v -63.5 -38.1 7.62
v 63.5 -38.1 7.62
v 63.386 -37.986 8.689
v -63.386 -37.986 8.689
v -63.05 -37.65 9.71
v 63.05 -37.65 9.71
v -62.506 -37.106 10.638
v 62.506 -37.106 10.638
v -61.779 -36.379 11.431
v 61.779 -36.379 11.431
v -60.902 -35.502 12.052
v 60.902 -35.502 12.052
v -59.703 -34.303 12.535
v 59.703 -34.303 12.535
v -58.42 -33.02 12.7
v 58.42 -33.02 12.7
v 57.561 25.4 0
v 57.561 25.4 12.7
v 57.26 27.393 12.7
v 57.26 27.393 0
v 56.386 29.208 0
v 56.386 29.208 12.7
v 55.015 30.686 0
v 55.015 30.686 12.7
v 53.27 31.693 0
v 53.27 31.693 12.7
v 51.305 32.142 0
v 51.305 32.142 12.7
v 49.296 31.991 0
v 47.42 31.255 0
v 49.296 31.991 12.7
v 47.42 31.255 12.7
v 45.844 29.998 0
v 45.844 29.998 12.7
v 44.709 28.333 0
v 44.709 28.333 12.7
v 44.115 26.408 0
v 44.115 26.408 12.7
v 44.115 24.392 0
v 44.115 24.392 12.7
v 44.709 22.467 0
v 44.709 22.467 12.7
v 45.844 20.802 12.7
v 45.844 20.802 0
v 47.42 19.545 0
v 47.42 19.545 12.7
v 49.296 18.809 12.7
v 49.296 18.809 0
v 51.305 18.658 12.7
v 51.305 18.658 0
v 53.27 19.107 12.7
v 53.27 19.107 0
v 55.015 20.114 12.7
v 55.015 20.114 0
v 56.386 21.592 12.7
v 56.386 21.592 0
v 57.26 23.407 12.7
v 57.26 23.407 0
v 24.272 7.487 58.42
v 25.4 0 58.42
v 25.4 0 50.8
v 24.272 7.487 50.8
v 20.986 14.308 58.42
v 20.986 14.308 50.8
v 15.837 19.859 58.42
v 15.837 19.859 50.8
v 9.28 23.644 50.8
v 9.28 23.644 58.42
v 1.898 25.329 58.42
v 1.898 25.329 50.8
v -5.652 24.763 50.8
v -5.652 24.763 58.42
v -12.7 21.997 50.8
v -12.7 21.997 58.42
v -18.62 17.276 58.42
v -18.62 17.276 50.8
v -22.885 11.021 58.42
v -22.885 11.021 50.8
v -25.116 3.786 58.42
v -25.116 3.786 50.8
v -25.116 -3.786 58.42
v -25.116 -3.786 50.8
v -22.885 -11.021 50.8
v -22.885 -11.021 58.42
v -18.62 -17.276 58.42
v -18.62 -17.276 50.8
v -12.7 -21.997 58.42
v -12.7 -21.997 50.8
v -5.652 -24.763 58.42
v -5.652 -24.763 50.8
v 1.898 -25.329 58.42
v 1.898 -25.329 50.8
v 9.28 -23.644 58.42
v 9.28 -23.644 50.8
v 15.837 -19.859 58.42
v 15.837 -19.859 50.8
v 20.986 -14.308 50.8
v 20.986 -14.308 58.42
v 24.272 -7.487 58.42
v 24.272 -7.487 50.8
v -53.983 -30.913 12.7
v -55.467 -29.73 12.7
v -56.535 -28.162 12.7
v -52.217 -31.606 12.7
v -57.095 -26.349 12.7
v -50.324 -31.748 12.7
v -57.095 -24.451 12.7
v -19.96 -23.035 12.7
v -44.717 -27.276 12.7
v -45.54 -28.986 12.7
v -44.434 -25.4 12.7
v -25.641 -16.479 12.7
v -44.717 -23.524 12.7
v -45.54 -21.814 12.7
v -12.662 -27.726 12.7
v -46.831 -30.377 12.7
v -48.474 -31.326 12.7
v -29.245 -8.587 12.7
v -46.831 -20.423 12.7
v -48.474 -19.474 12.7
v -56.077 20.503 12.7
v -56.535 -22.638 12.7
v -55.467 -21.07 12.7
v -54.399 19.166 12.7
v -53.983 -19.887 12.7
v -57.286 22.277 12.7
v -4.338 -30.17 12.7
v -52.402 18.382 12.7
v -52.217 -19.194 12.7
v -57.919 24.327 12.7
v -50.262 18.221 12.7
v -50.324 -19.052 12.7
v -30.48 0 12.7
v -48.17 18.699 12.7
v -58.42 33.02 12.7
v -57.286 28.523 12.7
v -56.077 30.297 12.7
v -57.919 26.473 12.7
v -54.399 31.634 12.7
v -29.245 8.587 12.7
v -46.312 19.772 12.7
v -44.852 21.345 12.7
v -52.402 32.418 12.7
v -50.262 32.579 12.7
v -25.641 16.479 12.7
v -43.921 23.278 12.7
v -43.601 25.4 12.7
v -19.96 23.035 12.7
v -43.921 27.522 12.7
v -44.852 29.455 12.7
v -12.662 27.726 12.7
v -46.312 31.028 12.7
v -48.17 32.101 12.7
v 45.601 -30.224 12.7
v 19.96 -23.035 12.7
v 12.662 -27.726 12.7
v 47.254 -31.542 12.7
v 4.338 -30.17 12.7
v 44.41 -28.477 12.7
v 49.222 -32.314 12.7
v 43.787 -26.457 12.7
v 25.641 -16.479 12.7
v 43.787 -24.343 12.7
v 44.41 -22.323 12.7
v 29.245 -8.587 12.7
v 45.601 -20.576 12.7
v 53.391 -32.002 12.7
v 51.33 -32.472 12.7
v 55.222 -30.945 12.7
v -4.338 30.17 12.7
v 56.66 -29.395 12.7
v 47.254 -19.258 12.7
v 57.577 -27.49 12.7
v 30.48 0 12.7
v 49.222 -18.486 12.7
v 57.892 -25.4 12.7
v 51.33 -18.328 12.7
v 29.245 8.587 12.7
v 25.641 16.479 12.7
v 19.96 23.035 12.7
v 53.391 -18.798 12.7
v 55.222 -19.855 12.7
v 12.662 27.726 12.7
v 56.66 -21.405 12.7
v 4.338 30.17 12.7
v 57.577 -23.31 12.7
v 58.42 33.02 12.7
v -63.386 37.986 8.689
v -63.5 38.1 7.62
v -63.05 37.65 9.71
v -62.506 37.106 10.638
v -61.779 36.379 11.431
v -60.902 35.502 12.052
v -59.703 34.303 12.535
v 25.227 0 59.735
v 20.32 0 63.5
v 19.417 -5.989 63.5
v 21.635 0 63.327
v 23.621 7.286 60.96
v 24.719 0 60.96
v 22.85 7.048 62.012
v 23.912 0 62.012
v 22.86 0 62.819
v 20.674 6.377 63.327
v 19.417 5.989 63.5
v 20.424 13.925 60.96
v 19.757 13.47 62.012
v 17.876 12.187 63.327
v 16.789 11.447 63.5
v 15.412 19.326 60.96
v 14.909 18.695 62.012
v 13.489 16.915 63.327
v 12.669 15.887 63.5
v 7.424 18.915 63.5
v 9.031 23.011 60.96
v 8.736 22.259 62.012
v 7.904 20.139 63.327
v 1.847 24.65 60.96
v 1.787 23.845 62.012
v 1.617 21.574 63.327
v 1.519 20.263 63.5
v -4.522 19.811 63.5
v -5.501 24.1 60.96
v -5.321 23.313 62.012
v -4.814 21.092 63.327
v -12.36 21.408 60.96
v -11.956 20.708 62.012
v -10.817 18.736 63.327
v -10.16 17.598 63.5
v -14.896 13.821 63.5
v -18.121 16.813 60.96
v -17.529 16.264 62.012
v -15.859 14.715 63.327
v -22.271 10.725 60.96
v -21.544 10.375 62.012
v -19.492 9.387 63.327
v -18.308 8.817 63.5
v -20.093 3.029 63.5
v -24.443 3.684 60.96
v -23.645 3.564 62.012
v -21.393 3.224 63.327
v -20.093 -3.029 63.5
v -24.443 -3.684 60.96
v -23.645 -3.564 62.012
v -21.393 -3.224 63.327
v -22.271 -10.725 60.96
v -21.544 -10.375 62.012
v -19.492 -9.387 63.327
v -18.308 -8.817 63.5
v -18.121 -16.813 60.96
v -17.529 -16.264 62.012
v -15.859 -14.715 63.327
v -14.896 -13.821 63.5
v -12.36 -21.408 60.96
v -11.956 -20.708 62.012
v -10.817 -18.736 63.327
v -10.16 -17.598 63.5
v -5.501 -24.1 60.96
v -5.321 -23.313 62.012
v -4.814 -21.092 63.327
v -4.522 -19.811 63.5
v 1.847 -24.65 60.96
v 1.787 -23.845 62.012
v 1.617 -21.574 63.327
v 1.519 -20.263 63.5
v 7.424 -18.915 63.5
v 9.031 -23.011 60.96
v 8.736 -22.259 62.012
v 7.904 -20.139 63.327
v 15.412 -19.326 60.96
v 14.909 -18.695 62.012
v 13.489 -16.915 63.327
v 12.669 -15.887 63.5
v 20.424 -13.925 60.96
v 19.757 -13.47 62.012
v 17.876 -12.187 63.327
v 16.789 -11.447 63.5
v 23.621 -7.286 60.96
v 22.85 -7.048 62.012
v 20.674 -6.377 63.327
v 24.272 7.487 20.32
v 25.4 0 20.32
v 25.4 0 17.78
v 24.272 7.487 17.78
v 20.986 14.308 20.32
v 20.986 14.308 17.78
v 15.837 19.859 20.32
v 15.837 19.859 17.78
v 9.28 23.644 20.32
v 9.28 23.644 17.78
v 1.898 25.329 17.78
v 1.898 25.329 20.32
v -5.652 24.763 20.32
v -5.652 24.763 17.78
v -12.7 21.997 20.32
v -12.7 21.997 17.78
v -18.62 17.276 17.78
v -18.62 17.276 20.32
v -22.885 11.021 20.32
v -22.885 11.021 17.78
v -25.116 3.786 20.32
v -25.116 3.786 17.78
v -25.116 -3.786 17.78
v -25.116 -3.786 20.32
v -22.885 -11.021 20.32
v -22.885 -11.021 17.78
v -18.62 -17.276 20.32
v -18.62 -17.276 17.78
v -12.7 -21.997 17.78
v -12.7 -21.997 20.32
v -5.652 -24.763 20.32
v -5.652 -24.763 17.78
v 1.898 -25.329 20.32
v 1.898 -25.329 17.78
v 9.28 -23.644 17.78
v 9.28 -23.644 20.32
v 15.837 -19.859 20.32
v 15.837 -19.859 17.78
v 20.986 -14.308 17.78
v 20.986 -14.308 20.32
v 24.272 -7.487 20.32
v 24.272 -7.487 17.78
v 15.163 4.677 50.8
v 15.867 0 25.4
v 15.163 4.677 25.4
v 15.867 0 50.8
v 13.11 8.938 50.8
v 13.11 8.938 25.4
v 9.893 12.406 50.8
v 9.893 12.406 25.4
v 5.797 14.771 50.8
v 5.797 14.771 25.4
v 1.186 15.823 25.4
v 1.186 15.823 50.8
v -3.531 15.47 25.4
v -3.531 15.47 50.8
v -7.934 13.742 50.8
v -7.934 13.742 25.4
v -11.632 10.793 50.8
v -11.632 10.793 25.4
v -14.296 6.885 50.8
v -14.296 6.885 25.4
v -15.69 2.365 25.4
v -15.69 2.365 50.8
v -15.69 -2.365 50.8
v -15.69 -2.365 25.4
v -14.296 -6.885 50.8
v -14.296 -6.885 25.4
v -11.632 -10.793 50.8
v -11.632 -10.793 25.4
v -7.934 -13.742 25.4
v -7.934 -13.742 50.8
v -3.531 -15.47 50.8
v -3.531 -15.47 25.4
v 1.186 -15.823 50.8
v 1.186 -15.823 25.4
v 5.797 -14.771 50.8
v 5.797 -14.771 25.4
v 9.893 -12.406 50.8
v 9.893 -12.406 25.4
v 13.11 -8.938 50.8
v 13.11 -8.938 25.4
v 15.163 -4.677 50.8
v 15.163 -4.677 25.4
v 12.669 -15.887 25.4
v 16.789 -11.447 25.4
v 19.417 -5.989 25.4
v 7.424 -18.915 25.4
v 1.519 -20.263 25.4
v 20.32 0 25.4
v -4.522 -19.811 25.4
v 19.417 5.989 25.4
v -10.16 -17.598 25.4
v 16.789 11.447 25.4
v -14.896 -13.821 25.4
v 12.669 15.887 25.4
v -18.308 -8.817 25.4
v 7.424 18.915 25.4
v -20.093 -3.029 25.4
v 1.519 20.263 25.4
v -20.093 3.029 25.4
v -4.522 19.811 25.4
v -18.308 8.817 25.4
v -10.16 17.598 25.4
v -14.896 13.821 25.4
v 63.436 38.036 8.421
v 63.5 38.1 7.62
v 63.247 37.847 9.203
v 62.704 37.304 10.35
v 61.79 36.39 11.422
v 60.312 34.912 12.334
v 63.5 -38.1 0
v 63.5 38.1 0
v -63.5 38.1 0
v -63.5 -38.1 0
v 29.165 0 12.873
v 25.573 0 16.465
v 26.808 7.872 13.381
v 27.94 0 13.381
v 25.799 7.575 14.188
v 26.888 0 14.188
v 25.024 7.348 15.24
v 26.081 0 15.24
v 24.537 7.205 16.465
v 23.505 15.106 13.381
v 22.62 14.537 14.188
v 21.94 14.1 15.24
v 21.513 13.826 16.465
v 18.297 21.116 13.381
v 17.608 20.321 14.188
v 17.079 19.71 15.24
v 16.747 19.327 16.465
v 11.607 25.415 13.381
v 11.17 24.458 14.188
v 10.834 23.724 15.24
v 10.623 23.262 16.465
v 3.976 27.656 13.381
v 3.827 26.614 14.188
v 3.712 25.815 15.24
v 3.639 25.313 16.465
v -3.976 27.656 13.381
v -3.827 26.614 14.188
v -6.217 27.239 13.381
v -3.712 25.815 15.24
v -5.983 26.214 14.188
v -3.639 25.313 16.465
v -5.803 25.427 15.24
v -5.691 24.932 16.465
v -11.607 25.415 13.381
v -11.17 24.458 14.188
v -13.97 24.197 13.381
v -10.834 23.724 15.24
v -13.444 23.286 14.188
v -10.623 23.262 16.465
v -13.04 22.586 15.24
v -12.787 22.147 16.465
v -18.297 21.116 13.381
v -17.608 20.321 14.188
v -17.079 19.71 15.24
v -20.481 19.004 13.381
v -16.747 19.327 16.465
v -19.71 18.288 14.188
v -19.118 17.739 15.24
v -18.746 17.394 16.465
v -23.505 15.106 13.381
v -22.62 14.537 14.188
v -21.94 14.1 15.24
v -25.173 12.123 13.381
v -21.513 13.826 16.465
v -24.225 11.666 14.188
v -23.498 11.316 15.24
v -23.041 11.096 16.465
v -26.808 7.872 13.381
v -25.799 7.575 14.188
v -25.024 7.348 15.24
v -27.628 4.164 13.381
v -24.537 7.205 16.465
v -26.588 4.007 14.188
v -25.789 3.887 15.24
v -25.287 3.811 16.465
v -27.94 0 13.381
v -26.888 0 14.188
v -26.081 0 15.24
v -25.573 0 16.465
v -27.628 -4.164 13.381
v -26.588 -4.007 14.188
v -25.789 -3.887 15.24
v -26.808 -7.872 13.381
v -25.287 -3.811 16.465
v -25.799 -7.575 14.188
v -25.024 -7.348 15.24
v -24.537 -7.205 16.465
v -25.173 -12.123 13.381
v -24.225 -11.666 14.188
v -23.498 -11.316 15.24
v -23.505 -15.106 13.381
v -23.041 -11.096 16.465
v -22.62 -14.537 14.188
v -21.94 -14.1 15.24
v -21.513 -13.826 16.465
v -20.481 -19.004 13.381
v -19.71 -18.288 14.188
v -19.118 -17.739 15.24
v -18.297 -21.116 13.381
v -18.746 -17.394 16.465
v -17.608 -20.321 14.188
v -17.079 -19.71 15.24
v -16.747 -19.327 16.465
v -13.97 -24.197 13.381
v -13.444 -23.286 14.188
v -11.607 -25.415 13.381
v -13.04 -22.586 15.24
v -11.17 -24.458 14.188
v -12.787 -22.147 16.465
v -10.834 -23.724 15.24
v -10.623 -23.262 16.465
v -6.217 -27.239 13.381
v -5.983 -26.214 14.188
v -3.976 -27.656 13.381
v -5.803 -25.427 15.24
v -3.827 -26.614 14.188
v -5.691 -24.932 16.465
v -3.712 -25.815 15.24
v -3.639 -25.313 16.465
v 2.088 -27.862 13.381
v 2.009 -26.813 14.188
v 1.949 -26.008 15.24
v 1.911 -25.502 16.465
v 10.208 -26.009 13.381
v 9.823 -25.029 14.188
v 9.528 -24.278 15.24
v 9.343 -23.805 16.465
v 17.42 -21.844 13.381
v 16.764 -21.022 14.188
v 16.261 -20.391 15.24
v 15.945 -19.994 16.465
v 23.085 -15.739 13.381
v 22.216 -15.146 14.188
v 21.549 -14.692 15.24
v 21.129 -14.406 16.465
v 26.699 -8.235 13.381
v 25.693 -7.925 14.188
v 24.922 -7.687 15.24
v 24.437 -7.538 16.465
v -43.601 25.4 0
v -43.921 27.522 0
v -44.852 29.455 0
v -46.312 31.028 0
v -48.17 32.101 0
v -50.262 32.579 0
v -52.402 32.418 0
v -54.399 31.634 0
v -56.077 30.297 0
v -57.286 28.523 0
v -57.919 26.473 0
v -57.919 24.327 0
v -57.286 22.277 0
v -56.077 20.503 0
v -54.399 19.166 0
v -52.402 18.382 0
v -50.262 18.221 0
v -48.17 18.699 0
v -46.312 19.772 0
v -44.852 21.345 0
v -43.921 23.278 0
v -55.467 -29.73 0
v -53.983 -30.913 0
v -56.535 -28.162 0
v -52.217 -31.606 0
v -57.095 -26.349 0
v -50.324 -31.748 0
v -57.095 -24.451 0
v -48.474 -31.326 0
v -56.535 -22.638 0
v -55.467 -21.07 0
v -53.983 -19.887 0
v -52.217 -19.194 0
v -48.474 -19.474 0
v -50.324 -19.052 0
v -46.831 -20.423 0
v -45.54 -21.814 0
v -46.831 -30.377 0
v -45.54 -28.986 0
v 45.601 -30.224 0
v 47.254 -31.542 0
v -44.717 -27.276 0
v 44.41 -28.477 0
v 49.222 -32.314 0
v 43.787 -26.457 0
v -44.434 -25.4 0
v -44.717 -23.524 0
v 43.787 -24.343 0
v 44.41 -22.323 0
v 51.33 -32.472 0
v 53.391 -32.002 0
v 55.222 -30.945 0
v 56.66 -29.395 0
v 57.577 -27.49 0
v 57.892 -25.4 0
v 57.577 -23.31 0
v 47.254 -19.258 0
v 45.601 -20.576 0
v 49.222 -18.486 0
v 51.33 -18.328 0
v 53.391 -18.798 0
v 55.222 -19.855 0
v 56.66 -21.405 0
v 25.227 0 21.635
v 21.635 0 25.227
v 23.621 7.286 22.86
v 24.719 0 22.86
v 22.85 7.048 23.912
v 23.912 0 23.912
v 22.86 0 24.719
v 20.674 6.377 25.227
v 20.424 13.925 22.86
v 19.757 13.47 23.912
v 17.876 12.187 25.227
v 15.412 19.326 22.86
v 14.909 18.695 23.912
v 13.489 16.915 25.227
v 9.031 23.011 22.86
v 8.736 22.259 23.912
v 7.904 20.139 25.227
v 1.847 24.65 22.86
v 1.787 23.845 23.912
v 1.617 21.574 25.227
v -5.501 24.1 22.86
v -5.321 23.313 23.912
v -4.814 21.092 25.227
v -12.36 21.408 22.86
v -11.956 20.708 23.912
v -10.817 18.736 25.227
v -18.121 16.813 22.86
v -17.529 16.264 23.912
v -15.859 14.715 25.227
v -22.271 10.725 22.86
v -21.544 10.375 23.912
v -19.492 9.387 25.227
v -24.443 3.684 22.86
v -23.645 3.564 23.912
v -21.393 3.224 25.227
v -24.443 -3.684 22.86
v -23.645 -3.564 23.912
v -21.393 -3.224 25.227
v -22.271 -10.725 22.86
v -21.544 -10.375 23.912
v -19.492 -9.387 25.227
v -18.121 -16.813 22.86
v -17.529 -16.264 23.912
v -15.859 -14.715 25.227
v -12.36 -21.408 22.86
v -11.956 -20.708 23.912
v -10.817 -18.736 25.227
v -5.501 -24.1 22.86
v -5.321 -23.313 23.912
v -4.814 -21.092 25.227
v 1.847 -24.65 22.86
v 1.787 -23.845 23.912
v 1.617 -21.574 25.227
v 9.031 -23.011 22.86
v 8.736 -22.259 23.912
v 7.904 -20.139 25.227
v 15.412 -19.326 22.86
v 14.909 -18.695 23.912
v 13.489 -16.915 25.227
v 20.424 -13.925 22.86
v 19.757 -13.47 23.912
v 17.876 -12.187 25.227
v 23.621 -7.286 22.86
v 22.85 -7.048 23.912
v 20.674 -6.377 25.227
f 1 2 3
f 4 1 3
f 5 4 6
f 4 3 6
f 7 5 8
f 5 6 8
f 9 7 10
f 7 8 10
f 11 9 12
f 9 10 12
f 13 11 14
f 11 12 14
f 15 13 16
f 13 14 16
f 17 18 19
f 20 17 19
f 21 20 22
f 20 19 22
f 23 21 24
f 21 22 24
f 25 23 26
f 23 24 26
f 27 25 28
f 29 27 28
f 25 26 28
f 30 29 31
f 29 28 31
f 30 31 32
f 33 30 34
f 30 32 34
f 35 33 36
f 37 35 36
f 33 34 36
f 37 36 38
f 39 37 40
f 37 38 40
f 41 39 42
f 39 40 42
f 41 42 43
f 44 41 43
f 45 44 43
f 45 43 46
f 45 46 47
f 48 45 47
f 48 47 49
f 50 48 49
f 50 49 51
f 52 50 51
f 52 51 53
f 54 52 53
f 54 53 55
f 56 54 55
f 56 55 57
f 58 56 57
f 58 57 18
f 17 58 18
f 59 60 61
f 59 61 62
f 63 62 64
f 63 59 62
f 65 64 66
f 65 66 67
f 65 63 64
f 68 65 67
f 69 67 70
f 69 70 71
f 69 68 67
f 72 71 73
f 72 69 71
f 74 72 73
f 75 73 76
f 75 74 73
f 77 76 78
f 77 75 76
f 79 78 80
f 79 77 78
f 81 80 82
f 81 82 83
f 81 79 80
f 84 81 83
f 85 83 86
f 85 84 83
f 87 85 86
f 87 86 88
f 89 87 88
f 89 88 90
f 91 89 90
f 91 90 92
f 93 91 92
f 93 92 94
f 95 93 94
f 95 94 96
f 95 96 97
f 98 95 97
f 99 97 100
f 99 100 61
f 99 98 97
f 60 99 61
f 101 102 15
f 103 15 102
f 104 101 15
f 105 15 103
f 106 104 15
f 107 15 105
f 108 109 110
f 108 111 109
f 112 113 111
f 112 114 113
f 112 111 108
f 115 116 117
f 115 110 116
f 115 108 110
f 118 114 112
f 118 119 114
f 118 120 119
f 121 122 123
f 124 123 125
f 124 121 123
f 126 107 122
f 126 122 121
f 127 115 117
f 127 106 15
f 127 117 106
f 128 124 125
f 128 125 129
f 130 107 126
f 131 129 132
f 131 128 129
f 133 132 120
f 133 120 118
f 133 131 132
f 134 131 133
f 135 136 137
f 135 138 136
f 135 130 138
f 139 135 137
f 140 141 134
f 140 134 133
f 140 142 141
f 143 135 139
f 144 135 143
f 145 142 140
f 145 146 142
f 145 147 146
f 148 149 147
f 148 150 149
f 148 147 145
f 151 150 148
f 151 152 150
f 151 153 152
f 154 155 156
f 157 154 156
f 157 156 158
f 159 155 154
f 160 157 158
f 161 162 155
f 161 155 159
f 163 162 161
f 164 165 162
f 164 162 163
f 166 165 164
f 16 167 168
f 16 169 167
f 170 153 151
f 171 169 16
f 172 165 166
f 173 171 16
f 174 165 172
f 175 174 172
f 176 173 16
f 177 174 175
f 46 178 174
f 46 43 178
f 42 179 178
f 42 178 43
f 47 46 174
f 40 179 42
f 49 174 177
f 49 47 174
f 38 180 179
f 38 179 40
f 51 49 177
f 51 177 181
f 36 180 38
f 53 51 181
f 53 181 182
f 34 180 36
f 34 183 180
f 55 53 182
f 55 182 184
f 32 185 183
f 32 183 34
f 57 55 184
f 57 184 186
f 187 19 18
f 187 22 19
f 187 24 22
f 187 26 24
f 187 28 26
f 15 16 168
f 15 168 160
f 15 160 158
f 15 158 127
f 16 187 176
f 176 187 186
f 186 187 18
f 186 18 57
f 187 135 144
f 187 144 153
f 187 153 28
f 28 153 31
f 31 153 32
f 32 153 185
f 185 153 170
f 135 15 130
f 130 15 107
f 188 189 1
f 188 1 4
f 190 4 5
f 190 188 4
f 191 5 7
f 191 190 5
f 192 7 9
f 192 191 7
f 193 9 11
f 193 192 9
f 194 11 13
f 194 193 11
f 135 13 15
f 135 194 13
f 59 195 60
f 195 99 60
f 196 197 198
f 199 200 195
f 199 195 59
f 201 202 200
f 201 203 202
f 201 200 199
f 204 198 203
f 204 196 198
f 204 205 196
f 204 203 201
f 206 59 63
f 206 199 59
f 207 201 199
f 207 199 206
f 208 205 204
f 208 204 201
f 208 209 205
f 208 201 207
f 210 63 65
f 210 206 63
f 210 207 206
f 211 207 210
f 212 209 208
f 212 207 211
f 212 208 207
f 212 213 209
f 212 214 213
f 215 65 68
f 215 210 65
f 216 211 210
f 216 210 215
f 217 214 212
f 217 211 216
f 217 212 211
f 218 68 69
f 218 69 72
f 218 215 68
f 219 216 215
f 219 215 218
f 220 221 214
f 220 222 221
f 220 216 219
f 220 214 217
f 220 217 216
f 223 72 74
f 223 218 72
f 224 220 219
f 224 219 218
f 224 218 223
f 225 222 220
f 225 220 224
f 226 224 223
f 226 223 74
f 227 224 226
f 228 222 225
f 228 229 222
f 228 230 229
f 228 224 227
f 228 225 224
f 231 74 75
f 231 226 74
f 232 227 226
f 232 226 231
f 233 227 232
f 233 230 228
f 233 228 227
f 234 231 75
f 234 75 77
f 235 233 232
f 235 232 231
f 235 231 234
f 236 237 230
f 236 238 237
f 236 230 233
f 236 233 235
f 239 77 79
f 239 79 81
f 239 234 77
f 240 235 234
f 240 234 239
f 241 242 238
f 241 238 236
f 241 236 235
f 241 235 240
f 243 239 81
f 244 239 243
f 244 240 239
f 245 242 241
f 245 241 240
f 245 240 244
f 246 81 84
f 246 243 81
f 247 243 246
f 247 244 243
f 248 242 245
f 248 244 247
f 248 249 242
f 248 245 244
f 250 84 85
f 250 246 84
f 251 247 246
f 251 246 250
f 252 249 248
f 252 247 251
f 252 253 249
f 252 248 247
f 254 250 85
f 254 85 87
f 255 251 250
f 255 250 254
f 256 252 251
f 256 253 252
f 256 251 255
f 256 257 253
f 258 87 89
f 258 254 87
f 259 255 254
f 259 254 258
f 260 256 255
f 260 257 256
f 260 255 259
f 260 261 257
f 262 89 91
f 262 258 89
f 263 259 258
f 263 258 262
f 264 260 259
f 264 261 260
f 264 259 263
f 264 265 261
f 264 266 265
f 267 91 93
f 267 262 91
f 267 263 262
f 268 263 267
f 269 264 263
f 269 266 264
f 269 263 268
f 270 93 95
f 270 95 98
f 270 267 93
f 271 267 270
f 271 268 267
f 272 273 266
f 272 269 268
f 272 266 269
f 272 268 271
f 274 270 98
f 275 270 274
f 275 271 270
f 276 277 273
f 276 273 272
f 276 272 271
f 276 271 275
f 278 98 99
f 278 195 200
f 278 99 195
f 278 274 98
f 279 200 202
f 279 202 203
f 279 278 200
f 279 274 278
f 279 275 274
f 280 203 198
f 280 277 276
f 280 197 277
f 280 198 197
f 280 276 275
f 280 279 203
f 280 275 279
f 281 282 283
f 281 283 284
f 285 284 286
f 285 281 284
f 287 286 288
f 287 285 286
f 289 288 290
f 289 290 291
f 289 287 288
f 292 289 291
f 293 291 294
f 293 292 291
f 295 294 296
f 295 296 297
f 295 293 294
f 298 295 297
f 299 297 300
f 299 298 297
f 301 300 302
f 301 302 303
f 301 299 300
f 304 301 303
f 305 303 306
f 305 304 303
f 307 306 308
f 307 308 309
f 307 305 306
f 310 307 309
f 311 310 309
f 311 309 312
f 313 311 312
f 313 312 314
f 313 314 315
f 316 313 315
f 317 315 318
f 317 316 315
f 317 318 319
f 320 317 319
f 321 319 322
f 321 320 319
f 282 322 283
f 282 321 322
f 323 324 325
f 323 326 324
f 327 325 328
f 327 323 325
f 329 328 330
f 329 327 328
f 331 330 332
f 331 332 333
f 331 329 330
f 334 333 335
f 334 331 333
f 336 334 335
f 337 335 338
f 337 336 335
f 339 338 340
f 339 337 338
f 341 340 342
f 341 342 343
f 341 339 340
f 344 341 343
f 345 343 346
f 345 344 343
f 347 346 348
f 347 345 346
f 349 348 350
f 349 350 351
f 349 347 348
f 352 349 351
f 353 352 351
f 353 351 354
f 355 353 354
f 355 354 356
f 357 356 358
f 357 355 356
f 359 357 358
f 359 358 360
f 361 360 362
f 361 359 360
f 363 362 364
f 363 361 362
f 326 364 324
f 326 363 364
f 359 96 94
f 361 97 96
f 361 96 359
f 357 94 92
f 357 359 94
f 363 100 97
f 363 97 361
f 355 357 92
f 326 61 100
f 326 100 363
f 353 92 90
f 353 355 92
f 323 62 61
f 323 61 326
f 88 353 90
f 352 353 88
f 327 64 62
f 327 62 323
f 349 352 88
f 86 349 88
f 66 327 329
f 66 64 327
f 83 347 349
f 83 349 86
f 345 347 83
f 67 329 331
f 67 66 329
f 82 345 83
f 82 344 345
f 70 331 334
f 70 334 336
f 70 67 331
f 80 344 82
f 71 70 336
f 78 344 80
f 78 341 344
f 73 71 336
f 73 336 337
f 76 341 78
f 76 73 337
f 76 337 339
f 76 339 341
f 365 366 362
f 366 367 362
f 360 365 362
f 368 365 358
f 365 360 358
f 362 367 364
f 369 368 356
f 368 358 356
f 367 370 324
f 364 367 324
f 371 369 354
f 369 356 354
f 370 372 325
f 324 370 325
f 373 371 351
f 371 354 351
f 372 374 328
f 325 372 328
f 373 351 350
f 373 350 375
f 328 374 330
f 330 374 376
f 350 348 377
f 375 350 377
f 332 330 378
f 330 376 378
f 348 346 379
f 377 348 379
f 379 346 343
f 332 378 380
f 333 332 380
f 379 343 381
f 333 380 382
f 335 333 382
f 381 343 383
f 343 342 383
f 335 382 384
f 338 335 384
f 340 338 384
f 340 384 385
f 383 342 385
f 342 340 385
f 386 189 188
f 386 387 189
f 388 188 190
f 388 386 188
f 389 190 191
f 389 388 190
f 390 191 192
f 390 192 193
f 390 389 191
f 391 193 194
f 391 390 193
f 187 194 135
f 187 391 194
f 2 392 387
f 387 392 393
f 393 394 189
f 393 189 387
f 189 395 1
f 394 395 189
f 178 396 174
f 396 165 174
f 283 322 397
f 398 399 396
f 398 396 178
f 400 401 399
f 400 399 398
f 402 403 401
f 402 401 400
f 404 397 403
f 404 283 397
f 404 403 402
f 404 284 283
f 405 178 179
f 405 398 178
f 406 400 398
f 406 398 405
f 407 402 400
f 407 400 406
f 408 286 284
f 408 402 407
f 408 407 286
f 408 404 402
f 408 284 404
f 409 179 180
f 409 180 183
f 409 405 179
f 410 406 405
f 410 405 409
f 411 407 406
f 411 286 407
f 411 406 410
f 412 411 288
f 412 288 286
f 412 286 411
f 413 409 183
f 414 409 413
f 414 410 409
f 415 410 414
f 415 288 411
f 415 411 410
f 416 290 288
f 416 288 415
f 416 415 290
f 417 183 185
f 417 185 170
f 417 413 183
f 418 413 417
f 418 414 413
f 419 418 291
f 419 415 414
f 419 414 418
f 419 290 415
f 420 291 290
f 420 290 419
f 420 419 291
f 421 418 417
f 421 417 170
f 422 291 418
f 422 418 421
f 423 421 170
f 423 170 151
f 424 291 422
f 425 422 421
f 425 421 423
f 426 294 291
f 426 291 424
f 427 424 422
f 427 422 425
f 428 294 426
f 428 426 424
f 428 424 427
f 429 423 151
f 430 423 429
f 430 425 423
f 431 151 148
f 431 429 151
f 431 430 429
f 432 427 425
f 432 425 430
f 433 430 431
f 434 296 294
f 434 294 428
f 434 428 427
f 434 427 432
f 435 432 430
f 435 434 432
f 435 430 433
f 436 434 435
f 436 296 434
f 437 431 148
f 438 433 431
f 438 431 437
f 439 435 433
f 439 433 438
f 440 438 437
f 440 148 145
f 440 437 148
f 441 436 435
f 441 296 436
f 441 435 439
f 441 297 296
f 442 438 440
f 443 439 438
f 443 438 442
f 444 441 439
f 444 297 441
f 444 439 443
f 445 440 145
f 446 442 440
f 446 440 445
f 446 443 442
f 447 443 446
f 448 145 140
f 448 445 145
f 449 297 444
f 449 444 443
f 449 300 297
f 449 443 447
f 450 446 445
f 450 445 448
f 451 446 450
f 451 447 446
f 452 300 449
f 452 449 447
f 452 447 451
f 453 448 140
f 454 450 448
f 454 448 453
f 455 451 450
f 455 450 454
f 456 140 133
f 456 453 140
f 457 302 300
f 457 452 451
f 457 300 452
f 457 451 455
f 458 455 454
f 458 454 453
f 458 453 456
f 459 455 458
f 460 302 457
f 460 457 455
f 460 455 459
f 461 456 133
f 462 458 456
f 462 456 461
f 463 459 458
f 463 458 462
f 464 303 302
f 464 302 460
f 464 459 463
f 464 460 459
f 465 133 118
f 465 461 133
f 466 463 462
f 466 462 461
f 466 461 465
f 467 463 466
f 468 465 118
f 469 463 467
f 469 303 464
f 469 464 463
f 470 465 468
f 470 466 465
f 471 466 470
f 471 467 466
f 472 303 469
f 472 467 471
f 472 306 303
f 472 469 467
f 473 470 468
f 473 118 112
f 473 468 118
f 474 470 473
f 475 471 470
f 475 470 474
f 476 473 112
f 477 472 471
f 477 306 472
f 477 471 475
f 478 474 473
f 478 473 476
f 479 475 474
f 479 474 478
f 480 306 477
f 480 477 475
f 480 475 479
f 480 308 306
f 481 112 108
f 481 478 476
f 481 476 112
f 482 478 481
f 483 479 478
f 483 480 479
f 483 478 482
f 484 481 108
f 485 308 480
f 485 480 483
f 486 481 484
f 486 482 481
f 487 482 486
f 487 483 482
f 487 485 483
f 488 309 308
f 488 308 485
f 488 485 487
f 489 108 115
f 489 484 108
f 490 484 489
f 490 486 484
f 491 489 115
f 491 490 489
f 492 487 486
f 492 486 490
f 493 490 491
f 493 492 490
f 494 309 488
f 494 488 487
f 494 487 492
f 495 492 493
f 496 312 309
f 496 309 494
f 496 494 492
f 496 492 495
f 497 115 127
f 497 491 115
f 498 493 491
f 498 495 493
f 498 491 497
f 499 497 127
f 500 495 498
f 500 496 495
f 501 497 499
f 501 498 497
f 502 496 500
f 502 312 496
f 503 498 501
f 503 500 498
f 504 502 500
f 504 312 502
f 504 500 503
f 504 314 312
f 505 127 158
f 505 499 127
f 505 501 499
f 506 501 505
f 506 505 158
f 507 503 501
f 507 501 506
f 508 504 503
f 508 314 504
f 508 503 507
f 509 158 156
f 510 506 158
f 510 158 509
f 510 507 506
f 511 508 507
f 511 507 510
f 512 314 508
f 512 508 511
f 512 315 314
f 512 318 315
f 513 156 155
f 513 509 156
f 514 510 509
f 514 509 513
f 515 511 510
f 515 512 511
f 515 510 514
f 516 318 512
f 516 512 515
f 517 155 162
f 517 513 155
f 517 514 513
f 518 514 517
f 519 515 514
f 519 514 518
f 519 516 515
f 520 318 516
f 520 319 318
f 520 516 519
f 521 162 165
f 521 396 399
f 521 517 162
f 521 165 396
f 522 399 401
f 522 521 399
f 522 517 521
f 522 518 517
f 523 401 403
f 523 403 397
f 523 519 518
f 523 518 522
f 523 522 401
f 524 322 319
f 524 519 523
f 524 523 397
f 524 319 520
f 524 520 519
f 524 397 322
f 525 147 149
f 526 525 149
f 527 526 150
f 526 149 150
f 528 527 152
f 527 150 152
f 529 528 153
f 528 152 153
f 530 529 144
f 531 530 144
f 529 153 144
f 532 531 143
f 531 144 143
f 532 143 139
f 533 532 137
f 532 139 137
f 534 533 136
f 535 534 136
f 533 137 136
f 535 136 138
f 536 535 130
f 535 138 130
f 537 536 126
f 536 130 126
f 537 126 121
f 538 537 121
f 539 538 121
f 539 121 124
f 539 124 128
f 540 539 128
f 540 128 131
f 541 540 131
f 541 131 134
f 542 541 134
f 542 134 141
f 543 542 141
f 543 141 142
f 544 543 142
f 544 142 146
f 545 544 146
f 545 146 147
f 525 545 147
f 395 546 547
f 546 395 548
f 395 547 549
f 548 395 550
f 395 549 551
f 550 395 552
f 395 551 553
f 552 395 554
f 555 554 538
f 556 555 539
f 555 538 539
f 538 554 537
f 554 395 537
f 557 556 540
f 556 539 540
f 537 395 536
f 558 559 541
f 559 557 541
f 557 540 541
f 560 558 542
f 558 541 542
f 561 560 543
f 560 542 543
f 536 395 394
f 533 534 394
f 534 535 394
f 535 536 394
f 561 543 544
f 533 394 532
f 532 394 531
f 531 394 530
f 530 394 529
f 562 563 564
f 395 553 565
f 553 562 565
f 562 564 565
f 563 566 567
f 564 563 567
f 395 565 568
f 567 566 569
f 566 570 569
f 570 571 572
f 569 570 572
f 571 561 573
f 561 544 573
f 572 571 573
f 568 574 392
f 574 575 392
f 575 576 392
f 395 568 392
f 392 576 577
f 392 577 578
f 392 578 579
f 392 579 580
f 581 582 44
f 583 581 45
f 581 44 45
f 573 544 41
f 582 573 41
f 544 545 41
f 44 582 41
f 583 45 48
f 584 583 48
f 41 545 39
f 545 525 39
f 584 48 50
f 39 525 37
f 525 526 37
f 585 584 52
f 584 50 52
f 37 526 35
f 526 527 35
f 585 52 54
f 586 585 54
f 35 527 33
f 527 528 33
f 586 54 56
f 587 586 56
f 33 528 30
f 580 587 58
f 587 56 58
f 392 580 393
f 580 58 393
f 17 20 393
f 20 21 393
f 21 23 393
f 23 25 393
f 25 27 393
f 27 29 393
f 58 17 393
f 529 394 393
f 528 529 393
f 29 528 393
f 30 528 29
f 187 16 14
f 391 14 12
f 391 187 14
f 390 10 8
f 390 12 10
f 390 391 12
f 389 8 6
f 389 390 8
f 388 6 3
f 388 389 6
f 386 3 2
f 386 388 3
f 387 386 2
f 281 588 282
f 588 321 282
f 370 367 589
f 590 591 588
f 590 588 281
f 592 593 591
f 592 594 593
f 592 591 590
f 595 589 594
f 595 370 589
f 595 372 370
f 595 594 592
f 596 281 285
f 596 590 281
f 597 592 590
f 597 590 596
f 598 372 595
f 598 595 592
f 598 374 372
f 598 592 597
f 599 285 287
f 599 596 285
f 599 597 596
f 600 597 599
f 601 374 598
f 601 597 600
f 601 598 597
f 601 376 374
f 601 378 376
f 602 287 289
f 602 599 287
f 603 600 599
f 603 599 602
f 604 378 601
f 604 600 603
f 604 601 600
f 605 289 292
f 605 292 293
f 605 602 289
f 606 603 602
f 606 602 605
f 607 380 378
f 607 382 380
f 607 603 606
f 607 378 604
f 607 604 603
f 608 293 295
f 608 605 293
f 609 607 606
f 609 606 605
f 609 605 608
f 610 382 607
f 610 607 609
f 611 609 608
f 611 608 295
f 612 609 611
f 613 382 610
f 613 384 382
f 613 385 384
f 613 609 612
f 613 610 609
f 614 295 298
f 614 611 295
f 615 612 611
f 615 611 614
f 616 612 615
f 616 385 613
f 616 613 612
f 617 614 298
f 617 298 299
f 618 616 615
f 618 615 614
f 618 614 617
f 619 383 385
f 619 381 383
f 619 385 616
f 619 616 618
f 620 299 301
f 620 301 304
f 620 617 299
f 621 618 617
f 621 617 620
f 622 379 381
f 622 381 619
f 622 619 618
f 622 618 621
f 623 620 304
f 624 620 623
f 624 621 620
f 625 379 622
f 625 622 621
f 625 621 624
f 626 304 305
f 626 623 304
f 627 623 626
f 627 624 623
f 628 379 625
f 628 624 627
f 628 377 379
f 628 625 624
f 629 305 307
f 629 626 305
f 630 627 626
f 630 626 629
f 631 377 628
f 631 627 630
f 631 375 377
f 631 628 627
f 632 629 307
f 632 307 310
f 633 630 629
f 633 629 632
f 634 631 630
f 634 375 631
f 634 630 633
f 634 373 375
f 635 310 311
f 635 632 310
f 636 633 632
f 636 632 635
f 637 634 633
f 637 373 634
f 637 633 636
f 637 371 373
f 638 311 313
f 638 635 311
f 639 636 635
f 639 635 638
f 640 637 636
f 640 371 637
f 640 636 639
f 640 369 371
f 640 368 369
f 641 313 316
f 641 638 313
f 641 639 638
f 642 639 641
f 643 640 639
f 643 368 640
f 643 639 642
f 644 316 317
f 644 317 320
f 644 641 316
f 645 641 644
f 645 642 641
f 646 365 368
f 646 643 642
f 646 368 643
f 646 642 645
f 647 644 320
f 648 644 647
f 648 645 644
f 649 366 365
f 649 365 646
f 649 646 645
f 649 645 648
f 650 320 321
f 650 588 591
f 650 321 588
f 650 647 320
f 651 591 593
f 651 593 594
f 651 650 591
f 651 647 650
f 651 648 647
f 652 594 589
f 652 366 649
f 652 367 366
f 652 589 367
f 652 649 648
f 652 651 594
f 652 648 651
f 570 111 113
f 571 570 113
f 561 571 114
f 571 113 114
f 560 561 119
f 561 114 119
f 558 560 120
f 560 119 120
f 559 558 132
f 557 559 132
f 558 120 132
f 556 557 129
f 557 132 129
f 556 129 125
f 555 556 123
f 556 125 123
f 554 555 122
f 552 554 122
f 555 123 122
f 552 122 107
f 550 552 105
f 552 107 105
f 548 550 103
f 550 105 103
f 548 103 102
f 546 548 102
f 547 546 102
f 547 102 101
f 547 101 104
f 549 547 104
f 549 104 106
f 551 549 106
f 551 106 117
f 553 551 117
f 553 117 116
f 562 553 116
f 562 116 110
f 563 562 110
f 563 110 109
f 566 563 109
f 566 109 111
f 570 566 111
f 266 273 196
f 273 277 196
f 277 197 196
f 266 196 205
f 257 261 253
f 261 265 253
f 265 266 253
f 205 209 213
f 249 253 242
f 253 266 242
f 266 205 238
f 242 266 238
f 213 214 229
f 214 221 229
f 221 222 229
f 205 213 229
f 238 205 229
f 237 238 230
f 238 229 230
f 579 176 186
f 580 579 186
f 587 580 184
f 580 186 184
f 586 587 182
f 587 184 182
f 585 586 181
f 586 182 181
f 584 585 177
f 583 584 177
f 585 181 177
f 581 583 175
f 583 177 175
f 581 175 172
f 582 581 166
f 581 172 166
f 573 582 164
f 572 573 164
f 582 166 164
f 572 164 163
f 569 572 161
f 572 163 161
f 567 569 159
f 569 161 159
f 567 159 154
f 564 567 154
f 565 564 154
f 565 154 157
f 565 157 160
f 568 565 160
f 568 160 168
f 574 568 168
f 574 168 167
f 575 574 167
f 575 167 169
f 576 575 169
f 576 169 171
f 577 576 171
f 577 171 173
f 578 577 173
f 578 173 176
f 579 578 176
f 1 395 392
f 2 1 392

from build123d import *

# Parameters (mm, degrees)
F0_W     = 127
F0_H     = 76.2
F1_DEPTH = 12.7
F2_R     = 7.198910885
F2_R_2   = 6.7607209877
F2_R_3   = 7.0919024912
F2_R_4   = 6.3659189417
F3_DEPTH = 12.701
F4_W     = 25.4
F4_H     = 50.8
F6_W     = 20.640426774
F6_H     = 25.4
F8_R     = 5.08


with BuildPart() as f1:
    # F0 (on Top) → F1 (new body)
    with BuildSketch(Plane.XY):
        Rectangle(F0_W, F0_H)
    extrude(amount=F1_DEPTH)

    # F2 (on face) → F3 (cut, through all)
    with BuildSketch(Plane.XY.offset(12.7)):
        with Locations((-50.8, 25.4)):
            Circle(F2_R)
        with Locations((50.8, 25.4)):
            Circle(F2_R_2)
        with Locations((50.8, -25.4)):
            Circle(F2_R_3)
        with Locations((-50.8, -25.4)):
            Circle(F2_R_4)
    extrude(amount=-F3_DEPTH, mode=Mode.SUBTRACT)

    # F4 (on Front) → F5 (revolve)
    with BuildSketch(Plane.XZ):
        with Locations((12.7, 38.1)):
            Rectangle(F4_W, F4_H)
    revolve(axis=Axis((0, 0, 38.1), (0, 0, 1)))

    # F6 (on Front) → F7 (revolve, cut)
    with BuildSketch(Plane.XZ):
        with Locations((26.1877048761, 38.1)):
            Rectangle(F6_W, F6_H)
    revolve(axis=Axis((0, 0, 12.7), (0, 0, 1)), mode=Mode.SUBTRACT)

    # F8
    f8_edges = [f1.edges().sort_by_distance(p)[0] for p in [
        (-25.4, 0, 63.5),
        (-25.4, 0, 12.7),
        (-25.4, 0, 25.4),
        (0, -38.1, 12.7),
        (63.5, 0, 12.7),
        (0, 38.1, 12.7),
        (-63.5, 0, 12.7),
    ]]
    fillet(f8_edges, radius=F8_R)


solid = f1.part
